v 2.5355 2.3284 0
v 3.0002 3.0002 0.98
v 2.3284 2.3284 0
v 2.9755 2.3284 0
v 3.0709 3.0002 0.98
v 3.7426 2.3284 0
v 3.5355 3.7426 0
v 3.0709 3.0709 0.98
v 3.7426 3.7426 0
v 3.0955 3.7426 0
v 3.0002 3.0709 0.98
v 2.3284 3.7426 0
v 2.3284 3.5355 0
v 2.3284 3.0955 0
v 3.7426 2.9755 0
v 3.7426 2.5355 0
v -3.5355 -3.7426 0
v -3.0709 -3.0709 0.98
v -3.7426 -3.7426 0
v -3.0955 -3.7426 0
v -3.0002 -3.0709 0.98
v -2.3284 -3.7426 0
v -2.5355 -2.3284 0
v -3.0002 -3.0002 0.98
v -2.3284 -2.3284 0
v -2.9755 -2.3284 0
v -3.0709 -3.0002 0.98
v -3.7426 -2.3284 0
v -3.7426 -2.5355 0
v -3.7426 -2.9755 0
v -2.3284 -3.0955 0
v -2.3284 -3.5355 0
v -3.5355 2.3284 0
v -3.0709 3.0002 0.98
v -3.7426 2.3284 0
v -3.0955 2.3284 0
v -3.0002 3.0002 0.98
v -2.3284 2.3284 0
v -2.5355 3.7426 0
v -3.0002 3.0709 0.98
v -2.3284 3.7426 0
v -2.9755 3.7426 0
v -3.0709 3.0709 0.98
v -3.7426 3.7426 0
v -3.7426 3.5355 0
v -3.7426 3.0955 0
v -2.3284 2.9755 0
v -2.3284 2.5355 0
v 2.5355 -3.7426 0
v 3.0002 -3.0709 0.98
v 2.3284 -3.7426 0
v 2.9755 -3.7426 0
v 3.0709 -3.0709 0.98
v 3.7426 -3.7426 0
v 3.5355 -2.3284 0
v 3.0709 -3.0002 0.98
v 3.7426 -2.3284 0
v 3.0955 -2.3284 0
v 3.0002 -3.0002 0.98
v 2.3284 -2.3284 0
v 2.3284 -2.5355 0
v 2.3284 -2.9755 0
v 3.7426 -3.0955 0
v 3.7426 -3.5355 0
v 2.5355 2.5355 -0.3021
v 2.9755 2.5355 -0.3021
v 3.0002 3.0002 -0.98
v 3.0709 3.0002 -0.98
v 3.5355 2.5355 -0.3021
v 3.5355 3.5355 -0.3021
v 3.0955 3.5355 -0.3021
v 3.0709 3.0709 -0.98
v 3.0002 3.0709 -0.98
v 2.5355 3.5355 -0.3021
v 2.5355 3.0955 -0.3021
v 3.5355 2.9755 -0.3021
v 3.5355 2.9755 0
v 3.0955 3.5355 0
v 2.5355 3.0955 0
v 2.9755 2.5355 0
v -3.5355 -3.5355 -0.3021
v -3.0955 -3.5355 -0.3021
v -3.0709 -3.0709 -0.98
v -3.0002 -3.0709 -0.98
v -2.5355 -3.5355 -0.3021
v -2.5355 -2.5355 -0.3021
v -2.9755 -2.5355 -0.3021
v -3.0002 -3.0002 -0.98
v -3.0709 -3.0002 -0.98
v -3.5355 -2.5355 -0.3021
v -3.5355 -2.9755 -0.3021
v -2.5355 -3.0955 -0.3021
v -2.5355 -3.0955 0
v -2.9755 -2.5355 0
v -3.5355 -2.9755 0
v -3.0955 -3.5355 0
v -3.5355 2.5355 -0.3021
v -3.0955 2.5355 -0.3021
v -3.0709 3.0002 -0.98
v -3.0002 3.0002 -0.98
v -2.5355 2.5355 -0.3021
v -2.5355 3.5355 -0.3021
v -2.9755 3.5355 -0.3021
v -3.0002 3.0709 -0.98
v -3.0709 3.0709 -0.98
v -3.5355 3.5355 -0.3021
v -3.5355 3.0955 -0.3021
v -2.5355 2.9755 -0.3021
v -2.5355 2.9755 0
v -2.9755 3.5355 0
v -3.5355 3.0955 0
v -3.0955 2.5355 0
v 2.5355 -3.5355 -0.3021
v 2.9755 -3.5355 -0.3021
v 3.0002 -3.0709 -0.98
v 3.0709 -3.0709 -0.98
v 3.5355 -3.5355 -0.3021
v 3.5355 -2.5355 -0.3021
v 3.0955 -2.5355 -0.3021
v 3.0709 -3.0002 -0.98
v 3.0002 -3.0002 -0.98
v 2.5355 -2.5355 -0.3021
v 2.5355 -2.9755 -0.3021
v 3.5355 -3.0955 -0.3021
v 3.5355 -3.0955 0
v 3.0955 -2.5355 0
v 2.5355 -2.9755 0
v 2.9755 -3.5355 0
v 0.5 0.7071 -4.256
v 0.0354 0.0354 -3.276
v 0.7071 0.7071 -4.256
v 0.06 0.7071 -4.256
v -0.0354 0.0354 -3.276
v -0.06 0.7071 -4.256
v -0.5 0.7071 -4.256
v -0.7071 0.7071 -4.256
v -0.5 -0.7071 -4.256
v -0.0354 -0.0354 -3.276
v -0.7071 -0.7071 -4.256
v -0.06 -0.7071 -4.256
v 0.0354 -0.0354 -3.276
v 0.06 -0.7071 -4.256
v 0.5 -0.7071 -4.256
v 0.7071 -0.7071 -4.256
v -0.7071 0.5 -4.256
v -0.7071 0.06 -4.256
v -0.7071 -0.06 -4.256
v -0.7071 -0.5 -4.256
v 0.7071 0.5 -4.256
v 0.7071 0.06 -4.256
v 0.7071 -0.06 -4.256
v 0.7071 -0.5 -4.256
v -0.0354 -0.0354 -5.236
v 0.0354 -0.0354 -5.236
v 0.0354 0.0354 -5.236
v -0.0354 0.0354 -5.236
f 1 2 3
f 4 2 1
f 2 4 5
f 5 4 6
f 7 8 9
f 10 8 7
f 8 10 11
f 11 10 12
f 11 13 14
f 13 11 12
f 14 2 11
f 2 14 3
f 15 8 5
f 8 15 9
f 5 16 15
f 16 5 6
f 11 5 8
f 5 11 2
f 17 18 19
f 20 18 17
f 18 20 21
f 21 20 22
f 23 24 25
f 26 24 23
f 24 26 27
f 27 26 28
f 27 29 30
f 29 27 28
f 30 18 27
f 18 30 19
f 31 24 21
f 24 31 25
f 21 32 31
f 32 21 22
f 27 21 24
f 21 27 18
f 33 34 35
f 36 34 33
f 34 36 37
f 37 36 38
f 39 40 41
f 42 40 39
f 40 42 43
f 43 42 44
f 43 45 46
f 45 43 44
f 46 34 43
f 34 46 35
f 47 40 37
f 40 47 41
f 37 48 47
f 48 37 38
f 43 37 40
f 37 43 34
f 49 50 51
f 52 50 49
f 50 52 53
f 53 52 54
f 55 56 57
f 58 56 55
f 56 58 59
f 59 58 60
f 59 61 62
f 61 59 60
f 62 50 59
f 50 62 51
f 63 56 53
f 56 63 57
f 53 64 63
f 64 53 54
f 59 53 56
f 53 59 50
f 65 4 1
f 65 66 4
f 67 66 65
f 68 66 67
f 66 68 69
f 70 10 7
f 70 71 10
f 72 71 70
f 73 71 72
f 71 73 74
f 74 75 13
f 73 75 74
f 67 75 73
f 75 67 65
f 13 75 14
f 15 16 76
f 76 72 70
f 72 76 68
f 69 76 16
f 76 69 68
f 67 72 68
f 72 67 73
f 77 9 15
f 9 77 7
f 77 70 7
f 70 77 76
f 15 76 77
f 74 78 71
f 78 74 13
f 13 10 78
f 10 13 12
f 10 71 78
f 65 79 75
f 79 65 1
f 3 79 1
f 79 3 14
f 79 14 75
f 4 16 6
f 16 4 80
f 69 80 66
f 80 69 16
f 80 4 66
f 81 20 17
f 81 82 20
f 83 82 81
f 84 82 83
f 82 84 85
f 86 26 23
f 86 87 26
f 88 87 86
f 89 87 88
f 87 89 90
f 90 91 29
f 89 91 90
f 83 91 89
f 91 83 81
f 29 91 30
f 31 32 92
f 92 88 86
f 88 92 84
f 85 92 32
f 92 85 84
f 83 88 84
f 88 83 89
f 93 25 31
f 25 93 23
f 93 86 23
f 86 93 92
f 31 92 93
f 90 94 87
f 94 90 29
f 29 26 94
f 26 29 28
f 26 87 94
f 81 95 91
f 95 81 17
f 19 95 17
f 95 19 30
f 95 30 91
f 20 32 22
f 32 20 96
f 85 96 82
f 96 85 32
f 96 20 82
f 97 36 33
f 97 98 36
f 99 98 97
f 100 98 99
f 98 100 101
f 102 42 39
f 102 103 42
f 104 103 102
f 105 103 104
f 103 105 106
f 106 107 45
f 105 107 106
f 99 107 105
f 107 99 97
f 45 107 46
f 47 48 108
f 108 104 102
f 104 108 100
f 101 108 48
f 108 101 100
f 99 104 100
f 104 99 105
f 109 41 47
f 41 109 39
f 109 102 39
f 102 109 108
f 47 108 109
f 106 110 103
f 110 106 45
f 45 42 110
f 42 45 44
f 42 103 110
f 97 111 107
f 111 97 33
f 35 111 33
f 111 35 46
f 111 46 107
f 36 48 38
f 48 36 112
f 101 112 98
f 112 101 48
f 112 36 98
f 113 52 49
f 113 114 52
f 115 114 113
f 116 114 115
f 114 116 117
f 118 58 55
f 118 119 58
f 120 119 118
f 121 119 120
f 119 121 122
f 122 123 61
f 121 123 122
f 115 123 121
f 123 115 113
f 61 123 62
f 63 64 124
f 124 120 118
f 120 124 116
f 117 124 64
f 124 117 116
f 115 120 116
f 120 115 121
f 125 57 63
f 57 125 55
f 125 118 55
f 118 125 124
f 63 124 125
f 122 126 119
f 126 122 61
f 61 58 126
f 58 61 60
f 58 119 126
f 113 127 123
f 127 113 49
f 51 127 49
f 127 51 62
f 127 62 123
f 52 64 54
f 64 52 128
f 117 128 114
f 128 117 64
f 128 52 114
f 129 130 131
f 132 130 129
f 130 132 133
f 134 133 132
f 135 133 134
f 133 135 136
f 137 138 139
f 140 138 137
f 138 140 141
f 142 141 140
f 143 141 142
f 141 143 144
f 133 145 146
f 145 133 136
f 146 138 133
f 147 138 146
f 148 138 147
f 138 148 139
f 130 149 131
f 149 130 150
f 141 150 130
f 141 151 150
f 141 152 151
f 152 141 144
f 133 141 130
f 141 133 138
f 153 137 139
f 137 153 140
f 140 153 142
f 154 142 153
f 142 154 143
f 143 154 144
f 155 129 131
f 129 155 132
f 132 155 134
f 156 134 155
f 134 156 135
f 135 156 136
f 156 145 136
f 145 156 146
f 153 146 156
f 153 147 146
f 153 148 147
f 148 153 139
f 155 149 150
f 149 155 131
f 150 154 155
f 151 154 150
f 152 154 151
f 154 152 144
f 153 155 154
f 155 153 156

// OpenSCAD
// Atop.scad
//
// Upper section



//-----------------------------------------------------------------
module top(order = 2,size = 2.5){

/* [Hidden] */
eps = 0.25;         // translate for pyramids
//epsr = 0.1;
epsr = 0.05;

epsh = 2.5*eps;
sq2 = 1.41421356;       
epsl = 0.5;         // translate for cube cuts
epsy = 0.12;        // translate for cube cuts

    scale([1,1,0.98])
    difference(){
        union(){
        difference() {
            ss(order-1,size);
            // remove bottom spikes
            translate([-120,-120,-3])cube([240,240,3]);
        }
        mirror([0,0,1])
        difference() {
            ss(order-1,size);
            translate([-120,-120,6])
            cube([240,240,80]);
        }
        }
        
    //    translate([-120,-120,thick*z-80])cube([240,240,80]);
    //    translate([-120,-120,thick*z+thick])cube([240,240,80]);

        if(1){
            // cut out top section
            size2=7.2*size;
            translate([0,0,17.2]){
                rotate([0,0,45])cylinder(r1=size2,r2 = epsr, h = 1.0*size2, $fn=4);
                mirror([0,0,1])
                rotate([0,0,45])cylinder(r1=size2,r2 = epsr, h = 1.0*size2, $fn=4);
            }
        }
    }

}

if(0){
mirror([0,0,1])
difference() {
    ss(order-1,size);
    //remove bottom spikes
    translate([-120,-120,6])
    cube([240,240,80]);
    //translate([-120,-120,3])
    //cube([240,240,-3]);
}
}

//----------------------------------------------------------
// sierpinsky recursive code 
module ss(ord,size){

/* [Hidden] */
eps = 0.25;         // translate for pyramids
//epsr = 0.1;
epsr = 0.05;

epsh = 2.5*eps;
sq2 = 1.41421356;       
epsl = 0.5;         // translate for cube cuts
epsy = 0.12;        // translate for cube cuts

    k = pow(2,ord);
    w = size *k;
    
    if (k<1){  // end of recursive function
        rotate([0,0,45])cylinder(r1=size,r2 = epsr, h = 1.0*size, $fn=4);
    }
    else {
      difference() {
        union () { // set the five smaller sierpinski pyramids
            // they are shifted so that there is an intersection for spiral vase
            translate([-k*eps+w/sq2,-k*eps+w/sq2,0]) ss(ord-1);  
            translate([k*eps-w/sq2,k*eps-w/sq2,0]) ss(ord-1); 
            translate([k*eps-w/sq2,-k*eps+w/sq2,0]) ss(ord-1); 
            translate([-k*eps+w/sq2,k*eps-w/sq2,0]) ss(ord-1); 
            translate([0,0,-sq2*k*eps+1.01*w]) rotate([180,0,0]) ss(ord-1);
            translate([0,0,-sq2*k*eps+1.01*w]) rotate([0,0,0]) ss(ord-1);    
          
          // petit carré au centre
            //cube([0.3,0.3,2], center = true);
             } // end union
     // remove 4 small cubes to allow a sierpinski curve
        translate([epsl,-epsy/2,0])  cube([sq2*w,epsy,epsh]);
        rotate([0,0,90]) translate([epsl,-epsy/2,0])  cube([sq2*w,epsy,epsh]);
        rotate([0,0,180]) translate([epsl,-epsy/2,0])  cube([sq2*w,epsy,epsh]);
        rotate([0,0,270]) translate([epsl,-epsy/2,0])  cube([sq2*w,epsy,epsh]);
     
    } // end diff    
   } // end else
 } // end module ss


//======================================================================

top();

//======================================================================
